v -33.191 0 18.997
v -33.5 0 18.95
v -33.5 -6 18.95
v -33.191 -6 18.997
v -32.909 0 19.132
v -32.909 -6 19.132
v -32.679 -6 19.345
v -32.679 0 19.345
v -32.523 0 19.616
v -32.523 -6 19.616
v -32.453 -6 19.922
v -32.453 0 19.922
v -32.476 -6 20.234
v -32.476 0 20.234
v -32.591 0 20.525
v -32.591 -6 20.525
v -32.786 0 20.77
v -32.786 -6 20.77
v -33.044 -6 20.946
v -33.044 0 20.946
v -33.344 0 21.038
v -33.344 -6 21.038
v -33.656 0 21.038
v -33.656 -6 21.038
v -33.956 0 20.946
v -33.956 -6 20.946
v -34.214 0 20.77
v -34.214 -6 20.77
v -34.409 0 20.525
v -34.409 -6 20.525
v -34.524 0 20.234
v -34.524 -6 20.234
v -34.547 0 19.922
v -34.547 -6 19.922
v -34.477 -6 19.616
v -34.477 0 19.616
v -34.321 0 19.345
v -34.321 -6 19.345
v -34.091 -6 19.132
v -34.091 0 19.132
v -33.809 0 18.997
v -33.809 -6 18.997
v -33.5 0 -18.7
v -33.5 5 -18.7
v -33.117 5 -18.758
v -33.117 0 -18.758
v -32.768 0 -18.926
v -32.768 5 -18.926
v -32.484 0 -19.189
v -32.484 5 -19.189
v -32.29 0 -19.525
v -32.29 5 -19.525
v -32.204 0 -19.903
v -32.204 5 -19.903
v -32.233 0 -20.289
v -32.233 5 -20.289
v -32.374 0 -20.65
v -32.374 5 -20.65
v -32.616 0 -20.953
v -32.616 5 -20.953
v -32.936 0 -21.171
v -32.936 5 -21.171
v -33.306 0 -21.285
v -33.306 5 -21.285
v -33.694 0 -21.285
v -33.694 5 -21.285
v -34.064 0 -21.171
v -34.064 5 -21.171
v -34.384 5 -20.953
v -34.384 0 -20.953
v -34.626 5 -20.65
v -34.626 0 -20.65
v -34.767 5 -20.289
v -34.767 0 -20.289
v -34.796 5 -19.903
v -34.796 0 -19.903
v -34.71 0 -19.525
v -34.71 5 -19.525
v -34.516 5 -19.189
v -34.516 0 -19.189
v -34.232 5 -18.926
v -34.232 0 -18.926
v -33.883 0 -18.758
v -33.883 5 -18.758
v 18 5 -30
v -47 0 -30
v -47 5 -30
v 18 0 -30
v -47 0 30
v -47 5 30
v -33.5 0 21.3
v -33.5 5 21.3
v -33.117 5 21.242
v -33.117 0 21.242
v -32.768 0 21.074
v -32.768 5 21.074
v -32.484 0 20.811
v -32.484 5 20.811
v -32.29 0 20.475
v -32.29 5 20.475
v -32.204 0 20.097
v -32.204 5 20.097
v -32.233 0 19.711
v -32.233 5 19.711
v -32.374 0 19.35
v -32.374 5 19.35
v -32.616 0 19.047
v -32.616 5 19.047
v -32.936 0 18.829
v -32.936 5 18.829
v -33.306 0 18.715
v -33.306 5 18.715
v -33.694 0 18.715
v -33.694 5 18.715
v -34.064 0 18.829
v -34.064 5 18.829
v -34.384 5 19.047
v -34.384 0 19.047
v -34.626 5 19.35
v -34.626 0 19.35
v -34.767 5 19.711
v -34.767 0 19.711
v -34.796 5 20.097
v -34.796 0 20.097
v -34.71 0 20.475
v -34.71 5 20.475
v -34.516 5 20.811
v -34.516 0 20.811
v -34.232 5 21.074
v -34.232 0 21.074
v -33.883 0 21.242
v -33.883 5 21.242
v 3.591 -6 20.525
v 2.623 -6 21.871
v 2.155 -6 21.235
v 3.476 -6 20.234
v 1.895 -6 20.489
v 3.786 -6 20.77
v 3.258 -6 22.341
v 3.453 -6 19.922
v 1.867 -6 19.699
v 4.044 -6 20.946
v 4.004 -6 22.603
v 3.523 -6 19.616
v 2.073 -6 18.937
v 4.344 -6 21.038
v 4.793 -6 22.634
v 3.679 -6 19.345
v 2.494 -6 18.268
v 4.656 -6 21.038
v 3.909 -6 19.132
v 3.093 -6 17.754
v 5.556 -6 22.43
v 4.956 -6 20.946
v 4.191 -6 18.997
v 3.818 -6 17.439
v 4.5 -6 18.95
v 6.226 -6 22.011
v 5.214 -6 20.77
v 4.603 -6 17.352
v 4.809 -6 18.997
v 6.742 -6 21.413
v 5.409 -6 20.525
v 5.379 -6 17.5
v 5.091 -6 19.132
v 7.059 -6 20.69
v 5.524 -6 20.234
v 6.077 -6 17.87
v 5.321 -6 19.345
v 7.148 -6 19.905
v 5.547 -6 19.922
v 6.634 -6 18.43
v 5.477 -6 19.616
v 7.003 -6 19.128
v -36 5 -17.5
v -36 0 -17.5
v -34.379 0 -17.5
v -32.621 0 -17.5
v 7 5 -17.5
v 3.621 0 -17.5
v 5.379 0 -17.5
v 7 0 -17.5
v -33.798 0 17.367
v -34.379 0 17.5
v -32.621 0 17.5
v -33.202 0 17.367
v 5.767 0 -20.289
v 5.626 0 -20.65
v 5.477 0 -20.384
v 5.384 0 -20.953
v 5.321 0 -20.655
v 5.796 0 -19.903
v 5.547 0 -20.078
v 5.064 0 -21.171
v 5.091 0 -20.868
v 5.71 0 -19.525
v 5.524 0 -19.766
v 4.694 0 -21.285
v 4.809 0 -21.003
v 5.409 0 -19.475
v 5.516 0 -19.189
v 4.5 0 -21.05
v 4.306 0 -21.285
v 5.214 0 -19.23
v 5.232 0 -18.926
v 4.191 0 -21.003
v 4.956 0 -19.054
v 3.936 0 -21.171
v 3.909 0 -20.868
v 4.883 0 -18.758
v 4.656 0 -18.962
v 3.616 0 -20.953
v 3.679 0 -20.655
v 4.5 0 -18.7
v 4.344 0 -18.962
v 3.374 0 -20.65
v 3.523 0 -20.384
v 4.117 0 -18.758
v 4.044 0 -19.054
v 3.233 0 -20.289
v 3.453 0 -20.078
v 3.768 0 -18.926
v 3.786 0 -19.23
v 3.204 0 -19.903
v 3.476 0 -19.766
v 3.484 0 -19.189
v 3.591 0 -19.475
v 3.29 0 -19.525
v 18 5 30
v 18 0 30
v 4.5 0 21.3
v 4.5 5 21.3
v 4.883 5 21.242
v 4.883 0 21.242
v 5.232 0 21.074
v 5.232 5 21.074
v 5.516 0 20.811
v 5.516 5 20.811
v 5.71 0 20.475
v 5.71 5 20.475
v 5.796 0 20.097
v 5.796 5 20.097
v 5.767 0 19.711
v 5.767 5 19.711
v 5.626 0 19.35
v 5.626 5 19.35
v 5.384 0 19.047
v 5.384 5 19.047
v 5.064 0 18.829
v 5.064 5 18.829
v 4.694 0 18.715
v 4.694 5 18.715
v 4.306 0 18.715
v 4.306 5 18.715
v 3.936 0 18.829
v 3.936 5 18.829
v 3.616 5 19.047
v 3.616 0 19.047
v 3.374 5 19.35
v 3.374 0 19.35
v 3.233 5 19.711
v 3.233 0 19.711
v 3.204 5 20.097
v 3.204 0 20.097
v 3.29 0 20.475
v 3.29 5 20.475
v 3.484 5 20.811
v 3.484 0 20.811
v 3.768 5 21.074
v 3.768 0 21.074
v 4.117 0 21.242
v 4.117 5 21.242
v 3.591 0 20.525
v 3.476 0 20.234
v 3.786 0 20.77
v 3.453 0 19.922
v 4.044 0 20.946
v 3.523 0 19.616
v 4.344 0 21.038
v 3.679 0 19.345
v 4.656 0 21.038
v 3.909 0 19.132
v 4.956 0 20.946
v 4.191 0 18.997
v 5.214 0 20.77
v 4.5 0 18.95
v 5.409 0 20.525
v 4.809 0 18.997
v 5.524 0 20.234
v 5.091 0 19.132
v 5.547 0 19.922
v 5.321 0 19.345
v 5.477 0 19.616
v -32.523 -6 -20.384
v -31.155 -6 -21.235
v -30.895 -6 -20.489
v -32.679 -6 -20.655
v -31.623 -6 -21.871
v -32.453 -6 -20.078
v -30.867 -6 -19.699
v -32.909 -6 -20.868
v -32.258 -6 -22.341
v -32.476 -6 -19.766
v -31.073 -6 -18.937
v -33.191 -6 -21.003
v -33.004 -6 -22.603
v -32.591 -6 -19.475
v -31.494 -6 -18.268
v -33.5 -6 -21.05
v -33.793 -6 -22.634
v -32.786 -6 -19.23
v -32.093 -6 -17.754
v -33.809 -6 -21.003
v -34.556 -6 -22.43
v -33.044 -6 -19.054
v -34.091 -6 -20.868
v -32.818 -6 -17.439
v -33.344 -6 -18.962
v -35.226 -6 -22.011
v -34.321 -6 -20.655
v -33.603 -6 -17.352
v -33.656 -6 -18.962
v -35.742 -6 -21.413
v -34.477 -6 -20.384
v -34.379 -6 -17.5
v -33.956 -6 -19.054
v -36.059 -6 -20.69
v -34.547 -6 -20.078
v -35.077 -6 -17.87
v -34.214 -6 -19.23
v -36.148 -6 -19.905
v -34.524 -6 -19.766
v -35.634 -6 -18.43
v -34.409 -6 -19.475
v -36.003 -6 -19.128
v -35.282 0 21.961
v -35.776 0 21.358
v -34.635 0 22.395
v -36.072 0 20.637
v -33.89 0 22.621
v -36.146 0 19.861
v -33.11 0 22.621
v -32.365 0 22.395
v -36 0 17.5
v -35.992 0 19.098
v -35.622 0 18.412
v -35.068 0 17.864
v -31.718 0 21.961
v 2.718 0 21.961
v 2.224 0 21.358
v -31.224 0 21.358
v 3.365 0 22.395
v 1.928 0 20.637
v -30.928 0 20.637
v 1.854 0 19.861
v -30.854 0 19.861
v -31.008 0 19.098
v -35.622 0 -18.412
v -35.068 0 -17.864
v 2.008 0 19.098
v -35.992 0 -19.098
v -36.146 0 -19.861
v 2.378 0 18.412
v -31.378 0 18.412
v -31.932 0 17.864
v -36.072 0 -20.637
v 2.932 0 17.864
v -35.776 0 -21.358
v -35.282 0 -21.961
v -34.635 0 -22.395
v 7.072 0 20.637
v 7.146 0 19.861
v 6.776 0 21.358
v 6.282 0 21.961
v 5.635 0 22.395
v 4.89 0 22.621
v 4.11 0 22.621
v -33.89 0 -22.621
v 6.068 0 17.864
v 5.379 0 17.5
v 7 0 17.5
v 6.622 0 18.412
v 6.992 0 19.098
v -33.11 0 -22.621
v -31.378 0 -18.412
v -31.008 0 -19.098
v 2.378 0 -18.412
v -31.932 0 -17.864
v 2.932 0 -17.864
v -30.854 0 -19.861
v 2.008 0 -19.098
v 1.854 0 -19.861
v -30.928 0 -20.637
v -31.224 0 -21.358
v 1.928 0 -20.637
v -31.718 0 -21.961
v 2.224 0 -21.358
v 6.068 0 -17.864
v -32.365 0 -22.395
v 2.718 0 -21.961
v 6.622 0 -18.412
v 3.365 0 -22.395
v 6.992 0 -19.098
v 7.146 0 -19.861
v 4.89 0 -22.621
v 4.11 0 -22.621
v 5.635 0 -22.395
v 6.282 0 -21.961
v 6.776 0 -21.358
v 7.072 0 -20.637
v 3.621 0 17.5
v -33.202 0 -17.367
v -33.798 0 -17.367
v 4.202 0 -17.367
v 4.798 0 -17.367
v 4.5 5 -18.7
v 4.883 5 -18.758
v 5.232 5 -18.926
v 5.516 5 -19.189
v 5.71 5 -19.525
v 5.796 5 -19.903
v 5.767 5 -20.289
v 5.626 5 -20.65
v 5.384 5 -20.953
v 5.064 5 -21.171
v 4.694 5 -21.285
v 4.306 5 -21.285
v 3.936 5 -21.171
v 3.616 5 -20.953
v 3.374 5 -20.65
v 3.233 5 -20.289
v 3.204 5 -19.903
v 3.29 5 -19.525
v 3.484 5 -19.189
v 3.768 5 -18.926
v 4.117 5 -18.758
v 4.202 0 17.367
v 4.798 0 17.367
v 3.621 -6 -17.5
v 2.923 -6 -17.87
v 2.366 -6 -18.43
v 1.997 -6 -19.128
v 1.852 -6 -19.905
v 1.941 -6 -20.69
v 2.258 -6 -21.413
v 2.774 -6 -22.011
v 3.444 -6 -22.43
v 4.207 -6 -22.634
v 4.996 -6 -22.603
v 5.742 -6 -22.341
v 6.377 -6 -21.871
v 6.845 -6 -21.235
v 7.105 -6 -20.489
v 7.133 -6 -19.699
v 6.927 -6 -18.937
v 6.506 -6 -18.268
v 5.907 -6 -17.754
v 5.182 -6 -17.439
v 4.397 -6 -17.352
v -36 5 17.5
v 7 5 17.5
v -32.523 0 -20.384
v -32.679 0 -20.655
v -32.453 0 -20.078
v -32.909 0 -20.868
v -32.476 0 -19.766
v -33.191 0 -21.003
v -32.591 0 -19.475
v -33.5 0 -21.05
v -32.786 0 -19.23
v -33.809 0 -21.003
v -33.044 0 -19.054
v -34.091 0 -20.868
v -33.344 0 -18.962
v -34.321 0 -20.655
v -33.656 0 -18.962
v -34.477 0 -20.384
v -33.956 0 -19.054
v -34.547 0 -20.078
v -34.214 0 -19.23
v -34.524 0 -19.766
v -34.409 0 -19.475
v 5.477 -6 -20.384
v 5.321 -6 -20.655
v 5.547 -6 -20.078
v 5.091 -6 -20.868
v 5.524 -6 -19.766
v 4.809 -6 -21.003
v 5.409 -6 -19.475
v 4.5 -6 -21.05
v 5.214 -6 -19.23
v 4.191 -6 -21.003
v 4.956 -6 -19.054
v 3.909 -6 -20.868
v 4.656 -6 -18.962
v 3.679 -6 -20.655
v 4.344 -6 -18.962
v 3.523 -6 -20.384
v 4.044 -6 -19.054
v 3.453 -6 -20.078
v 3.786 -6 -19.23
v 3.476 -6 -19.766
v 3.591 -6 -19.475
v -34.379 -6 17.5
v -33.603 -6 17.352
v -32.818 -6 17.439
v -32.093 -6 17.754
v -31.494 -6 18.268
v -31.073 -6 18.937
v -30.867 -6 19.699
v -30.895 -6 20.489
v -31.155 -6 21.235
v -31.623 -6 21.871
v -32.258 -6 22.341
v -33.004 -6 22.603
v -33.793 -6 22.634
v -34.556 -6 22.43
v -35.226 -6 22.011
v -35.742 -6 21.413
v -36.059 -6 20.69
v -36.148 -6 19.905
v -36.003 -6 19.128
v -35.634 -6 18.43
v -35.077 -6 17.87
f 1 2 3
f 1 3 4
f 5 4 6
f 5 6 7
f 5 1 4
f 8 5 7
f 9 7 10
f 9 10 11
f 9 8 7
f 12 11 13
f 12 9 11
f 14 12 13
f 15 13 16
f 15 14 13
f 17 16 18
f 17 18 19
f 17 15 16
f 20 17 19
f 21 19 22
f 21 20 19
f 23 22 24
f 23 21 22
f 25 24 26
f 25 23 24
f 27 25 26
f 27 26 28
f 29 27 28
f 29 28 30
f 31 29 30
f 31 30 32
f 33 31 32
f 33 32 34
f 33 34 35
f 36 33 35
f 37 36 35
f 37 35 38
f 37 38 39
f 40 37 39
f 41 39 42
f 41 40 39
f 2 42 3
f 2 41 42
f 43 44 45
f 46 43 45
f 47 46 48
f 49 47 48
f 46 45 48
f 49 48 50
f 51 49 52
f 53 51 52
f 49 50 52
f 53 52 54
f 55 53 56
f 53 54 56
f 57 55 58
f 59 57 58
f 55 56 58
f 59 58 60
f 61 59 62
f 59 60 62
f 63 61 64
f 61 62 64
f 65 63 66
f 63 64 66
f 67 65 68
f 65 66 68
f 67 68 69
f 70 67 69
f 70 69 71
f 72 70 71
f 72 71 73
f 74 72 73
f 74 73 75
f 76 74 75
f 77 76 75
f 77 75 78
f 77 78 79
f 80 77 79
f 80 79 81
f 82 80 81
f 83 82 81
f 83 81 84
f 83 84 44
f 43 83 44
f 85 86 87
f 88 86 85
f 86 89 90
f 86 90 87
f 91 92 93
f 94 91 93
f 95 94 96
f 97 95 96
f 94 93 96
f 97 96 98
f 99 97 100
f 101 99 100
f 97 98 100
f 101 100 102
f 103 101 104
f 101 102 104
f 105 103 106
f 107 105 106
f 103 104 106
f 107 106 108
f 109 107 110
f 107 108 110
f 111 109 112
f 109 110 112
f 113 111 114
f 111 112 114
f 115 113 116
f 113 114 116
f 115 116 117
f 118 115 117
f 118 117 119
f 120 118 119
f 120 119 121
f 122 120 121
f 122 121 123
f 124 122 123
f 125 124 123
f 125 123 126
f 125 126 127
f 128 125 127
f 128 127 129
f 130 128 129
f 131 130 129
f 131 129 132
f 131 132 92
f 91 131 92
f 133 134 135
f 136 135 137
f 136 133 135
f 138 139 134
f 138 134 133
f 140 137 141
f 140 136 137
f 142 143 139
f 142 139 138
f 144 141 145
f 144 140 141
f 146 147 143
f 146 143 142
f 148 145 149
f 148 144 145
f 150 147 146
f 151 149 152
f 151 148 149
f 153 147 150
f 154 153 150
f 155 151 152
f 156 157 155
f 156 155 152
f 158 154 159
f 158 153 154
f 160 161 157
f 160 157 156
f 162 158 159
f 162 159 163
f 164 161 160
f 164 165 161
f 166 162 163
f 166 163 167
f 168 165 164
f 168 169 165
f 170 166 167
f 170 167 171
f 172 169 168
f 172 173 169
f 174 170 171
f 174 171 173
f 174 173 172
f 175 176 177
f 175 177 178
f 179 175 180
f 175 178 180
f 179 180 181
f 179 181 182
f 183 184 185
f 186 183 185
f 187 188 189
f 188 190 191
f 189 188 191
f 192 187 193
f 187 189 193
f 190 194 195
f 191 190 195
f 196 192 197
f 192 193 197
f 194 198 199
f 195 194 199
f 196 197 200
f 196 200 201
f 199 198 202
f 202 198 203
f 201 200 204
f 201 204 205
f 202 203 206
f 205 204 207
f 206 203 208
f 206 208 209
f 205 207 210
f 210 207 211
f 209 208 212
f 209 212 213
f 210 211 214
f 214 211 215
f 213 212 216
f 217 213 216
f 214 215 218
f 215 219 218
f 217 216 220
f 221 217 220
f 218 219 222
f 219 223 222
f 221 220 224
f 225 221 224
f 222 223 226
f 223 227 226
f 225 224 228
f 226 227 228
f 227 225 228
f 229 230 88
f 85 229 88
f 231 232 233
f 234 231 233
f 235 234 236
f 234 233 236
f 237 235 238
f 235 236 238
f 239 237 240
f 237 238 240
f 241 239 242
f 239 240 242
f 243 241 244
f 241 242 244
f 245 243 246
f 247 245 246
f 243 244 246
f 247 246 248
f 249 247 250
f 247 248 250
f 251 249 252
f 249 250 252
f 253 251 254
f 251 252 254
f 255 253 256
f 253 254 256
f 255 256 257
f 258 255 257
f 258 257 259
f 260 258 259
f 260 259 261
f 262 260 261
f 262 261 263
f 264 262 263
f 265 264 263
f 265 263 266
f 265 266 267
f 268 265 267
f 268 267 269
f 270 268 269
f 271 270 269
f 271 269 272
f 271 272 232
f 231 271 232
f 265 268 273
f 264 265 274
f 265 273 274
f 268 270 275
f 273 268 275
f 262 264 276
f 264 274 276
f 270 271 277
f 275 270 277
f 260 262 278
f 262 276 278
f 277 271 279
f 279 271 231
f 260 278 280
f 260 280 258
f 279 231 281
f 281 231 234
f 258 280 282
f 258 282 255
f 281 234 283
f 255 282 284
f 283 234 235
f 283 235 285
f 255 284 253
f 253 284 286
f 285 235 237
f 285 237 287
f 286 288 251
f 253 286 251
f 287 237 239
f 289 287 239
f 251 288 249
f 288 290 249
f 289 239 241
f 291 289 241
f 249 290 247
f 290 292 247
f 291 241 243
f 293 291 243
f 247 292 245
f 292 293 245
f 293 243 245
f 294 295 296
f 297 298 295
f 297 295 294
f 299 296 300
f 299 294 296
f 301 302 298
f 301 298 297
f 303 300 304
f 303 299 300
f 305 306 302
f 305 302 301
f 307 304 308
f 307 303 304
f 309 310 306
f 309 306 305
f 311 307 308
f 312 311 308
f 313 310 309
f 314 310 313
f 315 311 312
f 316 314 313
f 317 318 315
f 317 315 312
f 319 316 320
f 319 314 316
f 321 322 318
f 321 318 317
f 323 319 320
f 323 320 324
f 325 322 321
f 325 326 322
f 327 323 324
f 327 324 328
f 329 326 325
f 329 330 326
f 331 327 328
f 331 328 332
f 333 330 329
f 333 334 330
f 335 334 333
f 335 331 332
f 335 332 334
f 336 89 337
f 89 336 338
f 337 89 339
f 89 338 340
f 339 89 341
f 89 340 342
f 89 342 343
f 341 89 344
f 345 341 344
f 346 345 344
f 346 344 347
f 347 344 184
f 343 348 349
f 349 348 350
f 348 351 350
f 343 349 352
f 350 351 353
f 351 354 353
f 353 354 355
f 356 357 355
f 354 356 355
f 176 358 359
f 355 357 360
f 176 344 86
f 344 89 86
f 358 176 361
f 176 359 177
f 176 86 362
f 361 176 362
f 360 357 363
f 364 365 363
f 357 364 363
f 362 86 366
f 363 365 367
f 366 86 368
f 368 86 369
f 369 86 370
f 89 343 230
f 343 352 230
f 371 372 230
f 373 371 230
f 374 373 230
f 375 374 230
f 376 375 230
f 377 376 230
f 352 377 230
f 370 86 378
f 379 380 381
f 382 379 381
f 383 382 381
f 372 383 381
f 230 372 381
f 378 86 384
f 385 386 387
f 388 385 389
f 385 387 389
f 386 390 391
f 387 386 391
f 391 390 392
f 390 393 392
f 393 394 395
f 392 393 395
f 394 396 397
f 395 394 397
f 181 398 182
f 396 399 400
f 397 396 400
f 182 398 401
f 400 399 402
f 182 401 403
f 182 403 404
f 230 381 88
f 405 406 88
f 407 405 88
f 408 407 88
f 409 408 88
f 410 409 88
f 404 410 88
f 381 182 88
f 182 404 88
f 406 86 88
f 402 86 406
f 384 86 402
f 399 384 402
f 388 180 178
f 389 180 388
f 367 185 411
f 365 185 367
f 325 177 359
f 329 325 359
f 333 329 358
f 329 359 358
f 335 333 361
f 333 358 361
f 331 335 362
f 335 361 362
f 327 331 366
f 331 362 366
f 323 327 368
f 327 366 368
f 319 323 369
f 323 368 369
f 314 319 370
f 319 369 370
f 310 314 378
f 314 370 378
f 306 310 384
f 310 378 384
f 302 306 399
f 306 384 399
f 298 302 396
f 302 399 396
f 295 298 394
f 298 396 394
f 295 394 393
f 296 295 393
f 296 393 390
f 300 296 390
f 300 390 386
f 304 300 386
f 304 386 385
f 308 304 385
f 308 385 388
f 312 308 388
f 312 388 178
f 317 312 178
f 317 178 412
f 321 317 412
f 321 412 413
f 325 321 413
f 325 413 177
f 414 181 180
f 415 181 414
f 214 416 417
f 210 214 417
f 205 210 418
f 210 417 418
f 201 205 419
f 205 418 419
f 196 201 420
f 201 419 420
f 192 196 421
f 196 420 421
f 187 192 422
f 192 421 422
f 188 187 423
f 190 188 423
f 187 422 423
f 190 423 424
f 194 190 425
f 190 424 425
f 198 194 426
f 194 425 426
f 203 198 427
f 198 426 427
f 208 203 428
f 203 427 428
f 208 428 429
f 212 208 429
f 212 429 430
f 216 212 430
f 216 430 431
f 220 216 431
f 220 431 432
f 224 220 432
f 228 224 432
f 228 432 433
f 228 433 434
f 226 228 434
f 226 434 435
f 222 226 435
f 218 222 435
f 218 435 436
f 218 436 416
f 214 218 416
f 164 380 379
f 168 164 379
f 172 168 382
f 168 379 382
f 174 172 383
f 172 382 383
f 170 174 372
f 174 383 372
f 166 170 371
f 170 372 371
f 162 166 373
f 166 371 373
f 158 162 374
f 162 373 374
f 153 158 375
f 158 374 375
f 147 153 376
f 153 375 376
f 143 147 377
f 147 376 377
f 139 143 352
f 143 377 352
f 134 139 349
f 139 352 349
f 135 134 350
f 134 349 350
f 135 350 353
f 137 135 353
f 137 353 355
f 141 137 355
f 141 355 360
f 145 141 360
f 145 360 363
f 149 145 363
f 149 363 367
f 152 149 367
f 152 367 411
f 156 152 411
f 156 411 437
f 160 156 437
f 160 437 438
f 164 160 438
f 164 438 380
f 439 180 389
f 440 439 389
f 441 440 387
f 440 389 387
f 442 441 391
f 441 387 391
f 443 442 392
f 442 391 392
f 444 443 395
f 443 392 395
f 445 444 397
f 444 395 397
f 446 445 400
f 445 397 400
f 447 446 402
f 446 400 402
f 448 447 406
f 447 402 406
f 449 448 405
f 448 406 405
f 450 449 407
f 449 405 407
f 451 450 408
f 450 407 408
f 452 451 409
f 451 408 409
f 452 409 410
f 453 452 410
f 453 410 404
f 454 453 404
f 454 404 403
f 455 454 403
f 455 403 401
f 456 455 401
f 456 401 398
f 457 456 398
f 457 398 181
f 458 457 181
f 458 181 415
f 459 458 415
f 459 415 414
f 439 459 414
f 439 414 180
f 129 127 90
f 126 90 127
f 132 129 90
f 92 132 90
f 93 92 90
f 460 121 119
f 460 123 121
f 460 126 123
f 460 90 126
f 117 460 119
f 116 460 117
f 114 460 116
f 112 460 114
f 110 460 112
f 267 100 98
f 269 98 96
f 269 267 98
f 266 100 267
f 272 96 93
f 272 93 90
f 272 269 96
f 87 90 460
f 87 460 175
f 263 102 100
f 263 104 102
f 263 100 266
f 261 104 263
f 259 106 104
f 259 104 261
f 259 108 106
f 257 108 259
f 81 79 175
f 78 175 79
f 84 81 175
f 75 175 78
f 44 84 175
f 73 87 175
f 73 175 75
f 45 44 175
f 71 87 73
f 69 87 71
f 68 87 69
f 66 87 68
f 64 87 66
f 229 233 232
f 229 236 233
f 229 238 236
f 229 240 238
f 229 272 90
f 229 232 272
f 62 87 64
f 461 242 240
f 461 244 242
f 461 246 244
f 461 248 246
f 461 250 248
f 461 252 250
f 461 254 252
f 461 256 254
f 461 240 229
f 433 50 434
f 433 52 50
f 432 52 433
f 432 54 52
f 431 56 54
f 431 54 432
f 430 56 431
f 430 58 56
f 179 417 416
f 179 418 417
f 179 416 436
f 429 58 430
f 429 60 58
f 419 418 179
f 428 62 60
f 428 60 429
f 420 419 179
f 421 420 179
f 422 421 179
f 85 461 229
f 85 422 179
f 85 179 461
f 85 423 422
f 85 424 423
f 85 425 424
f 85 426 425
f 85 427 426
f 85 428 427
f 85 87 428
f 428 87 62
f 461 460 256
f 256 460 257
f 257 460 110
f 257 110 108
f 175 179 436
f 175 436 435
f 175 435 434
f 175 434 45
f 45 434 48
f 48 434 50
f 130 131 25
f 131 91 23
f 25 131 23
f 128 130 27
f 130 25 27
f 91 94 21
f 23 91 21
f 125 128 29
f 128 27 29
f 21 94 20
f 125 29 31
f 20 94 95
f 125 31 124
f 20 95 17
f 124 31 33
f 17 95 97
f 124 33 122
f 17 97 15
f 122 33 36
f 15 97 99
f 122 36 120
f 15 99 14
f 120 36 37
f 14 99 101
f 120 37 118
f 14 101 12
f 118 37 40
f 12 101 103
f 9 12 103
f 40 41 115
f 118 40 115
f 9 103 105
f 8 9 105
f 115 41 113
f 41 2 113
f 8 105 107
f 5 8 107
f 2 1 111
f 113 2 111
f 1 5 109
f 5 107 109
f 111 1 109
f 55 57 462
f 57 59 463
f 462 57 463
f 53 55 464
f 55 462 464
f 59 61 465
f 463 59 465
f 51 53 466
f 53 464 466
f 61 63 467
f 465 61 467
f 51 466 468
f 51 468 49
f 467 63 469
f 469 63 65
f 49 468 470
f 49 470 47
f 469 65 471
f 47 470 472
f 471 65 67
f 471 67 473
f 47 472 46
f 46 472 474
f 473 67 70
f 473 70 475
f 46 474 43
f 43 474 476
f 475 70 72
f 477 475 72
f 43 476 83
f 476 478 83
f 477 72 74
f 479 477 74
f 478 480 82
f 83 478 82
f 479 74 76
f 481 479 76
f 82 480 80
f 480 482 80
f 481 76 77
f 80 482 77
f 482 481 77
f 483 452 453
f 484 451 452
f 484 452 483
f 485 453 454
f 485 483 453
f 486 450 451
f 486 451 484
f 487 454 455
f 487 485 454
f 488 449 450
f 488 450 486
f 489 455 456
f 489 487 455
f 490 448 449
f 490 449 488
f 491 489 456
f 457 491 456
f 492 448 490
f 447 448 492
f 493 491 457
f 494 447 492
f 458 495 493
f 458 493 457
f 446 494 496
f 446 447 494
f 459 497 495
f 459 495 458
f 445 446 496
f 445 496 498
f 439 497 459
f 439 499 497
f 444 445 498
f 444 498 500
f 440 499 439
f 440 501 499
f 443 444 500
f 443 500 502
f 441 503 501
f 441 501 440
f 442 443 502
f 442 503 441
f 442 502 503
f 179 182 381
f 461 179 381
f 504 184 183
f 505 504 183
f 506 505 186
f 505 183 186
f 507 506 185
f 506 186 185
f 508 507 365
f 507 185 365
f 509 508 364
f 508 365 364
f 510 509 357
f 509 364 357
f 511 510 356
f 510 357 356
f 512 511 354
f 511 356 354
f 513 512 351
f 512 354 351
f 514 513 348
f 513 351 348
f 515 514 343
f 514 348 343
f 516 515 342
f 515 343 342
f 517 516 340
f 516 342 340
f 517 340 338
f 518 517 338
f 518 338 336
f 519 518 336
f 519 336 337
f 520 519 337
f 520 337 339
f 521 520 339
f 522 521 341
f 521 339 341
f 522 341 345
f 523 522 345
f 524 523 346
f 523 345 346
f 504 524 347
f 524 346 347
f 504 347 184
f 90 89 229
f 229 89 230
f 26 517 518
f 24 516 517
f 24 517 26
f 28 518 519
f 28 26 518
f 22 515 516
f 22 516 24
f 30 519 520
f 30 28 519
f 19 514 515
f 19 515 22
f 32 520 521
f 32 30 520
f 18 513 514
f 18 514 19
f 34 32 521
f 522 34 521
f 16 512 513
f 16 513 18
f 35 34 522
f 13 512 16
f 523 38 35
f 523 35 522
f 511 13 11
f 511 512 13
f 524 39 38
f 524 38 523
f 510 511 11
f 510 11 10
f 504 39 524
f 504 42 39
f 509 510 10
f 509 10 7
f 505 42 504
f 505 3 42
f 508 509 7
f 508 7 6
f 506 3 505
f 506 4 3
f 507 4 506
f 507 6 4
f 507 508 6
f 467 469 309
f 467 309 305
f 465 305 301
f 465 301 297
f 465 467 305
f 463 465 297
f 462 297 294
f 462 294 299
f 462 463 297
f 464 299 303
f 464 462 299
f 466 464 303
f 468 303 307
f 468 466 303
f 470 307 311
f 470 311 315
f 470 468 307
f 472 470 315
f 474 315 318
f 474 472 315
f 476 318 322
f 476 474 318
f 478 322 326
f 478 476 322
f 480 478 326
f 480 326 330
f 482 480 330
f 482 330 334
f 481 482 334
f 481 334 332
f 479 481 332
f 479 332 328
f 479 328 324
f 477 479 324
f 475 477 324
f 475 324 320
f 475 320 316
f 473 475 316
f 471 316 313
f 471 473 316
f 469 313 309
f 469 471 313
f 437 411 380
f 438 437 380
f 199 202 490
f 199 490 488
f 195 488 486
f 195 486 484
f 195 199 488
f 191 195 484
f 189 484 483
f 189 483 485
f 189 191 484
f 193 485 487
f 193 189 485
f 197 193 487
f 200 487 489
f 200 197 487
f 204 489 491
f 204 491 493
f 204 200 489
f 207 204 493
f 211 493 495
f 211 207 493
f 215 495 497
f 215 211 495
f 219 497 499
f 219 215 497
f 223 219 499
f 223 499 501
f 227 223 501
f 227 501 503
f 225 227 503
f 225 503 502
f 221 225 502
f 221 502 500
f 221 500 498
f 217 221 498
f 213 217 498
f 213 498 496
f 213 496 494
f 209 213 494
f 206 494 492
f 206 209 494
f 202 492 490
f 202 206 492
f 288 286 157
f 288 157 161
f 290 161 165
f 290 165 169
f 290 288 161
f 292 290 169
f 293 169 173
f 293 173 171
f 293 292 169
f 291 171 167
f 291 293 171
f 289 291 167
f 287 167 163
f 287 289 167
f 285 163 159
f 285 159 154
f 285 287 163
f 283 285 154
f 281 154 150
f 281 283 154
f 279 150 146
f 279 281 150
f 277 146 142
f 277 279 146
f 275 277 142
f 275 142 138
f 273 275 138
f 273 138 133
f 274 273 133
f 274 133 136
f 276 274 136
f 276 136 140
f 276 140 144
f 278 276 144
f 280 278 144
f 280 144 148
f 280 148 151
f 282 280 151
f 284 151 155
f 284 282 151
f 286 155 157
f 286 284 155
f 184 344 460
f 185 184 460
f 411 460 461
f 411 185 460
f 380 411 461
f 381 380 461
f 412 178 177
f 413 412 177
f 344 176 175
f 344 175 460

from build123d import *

# Parameters (mm, degrees)
SKETCH3_W           = 65
SKETCH3_H           = 60
BOSS_EXTRUDE3_DEPTH = 5
SKETCH5_W           = 43
SKETCH5_H           = 35
CUT_EXTRUDE2_DEPTH  = 10
CUT_EXTRUDE1_REACH  = 57.982
SKETCH4_R           = 1.3
SKETCH9_R           = 2.65
SKETCH9_R_2         = 1.05
BOSS_EXTRUDE5_DEPTH = 6


with BuildPart() as part:
    # Sketch3 → Boss-Extrude3 (new body)
    with BuildSketch(Plane(origin=(0, 0, 0), x_dir=(1, 0, 0), z_dir=(0, 1, 0))):
        with Locations((-14.5, 0)):
            Rectangle(SKETCH3_W, SKETCH3_H)
    extrude(amount=BOSS_EXTRUDE3_DEPTH)

    # Sketch5 → Cut-Extrude2 (cut)
    with BuildSketch(Plane.XZ):
        with Locations((-14.5, 0)):
            Rectangle(SKETCH5_W, SKETCH5_H)
    extrude(amount=-CUT_EXTRUDE2_DEPTH, mode=Mode.SUBTRACT)

    # Sketch4 → Cut-Extrude1 (cut, up to next)
    with BuildSketch(Plane(origin=(0, 5, 0), x_dir=(1, 0, 0), z_dir=(0, 1, 0)), mode=Mode.PRIVATE) as cut_extrude1_sk1:
        with Locations(Location((-33.5, 20, 0), (0, 0, 270))):
            Circle(SKETCH4_R)
    cut_extrude1_tool1 = extrude(cut_extrude1_sk1.sketch, amount=-CUT_EXTRUDE1_REACH, mode=Mode.PRIVATE) & part.part
    # Sketch4 → Cut-Extrude1 (cut, up to next)
    with BuildSketch(Plane(origin=(0, 5, 0), x_dir=(1, 0, 0), z_dir=(0, 1, 0)), mode=Mode.PRIVATE) as cut_extrude1_sk2:
        with Locations(Location((4.5, 20, 0), (0, 0, 270))):
            Circle(SKETCH4_R)
    cut_extrude1_tool2 = extrude(cut_extrude1_sk2.sketch, amount=-CUT_EXTRUDE1_REACH, mode=Mode.PRIVATE) & part.part
    # Sketch4 → Cut-Extrude1 (cut, up to next)
    with BuildSketch(Plane(origin=(0, 5, 0), x_dir=(1, 0, 0), z_dir=(0, 1, 0)), mode=Mode.PRIVATE) as cut_extrude1_sk3:
        with Locations(Location((4.5, -20, 0), (0, 0, 270))):
            Circle(SKETCH4_R)
    cut_extrude1_tool3 = extrude(cut_extrude1_sk3.sketch, amount=-CUT_EXTRUDE1_REACH, mode=Mode.PRIVATE) & part.part
    # Sketch4 → Cut-Extrude1 (cut, up to next)
    with BuildSketch(Plane(origin=(0, 5, 0), x_dir=(1, 0, 0), z_dir=(0, 1, 0)), mode=Mode.PRIVATE) as cut_extrude1_sk4:
        with Locations(Location((-33.5, -20, 0), (0, 0, 270))):
            Circle(SKETCH4_R)
    cut_extrude1_tool4 = extrude(cut_extrude1_sk4.sketch, amount=-CUT_EXTRUDE1_REACH, mode=Mode.PRIVATE) & part.part
    add(cut_extrude1_tool1.solids().sort_by_distance((-33.5, 5, -20))[0], mode=Mode.SUBTRACT)
    add(cut_extrude1_tool2.solids().sort_by_distance((4.5, 5, -20))[0], mode=Mode.SUBTRACT)
    add(cut_extrude1_tool3.solids().sort_by_distance((4.5, 5, 20))[0], mode=Mode.SUBTRACT)
    add(cut_extrude1_tool4.solids().sort_by_distance((-33.5, 5, 20))[0], mode=Mode.SUBTRACT)

    # Sketch9 → Boss-Extrude5 (add)
    # profile 1 of 4: a face of its own
    with BuildSketch(Plane.XZ):
        with Locations(Location((-33.5, 20, 0), (0, 0, 250.629961754))):
            Circle(SKETCH9_R)
        with Locations(Location((-33.5, 20, 0), (0, 0, 270))):
            Circle(SKETCH9_R_2, mode=Mode.SUBTRACT)
    # profile 2 of 4: a face of its own
    with BuildSketch(Plane.XZ):
        with Locations(Location((-33.5, -20, 0), (0, 0, 109.370038246))):
            Circle(SKETCH9_R)
        with Locations(Location((-33.5, -20, 0), (0, 0, 270))):
            Circle(SKETCH9_R_2, mode=Mode.SUBTRACT)
    # profile 3 of 4: a face of its own
    with BuildSketch(Plane.XZ):
        with Locations(Location((4.5, 20, 0), (0, 0, 289.370038246))):
            Circle(SKETCH9_R)
        with Locations(Location((4.5, 20, 0), (0, 0, 270))):
            Circle(SKETCH9_R_2, mode=Mode.SUBTRACT)
    # profile 4 of 4: a face of its own
    with BuildSketch(Plane.XZ):
        with Locations(Location((4.5, -20, 0), (0, 0, 109.370038246))):
            Circle(SKETCH9_R)
        with Locations(Location((4.5, -20, 0), (0, 0, 270))):
            Circle(SKETCH9_R_2, mode=Mode.SUBTRACT)
    extrude(amount=BOSS_EXTRUDE5_DEPTH)


solid = part.part
